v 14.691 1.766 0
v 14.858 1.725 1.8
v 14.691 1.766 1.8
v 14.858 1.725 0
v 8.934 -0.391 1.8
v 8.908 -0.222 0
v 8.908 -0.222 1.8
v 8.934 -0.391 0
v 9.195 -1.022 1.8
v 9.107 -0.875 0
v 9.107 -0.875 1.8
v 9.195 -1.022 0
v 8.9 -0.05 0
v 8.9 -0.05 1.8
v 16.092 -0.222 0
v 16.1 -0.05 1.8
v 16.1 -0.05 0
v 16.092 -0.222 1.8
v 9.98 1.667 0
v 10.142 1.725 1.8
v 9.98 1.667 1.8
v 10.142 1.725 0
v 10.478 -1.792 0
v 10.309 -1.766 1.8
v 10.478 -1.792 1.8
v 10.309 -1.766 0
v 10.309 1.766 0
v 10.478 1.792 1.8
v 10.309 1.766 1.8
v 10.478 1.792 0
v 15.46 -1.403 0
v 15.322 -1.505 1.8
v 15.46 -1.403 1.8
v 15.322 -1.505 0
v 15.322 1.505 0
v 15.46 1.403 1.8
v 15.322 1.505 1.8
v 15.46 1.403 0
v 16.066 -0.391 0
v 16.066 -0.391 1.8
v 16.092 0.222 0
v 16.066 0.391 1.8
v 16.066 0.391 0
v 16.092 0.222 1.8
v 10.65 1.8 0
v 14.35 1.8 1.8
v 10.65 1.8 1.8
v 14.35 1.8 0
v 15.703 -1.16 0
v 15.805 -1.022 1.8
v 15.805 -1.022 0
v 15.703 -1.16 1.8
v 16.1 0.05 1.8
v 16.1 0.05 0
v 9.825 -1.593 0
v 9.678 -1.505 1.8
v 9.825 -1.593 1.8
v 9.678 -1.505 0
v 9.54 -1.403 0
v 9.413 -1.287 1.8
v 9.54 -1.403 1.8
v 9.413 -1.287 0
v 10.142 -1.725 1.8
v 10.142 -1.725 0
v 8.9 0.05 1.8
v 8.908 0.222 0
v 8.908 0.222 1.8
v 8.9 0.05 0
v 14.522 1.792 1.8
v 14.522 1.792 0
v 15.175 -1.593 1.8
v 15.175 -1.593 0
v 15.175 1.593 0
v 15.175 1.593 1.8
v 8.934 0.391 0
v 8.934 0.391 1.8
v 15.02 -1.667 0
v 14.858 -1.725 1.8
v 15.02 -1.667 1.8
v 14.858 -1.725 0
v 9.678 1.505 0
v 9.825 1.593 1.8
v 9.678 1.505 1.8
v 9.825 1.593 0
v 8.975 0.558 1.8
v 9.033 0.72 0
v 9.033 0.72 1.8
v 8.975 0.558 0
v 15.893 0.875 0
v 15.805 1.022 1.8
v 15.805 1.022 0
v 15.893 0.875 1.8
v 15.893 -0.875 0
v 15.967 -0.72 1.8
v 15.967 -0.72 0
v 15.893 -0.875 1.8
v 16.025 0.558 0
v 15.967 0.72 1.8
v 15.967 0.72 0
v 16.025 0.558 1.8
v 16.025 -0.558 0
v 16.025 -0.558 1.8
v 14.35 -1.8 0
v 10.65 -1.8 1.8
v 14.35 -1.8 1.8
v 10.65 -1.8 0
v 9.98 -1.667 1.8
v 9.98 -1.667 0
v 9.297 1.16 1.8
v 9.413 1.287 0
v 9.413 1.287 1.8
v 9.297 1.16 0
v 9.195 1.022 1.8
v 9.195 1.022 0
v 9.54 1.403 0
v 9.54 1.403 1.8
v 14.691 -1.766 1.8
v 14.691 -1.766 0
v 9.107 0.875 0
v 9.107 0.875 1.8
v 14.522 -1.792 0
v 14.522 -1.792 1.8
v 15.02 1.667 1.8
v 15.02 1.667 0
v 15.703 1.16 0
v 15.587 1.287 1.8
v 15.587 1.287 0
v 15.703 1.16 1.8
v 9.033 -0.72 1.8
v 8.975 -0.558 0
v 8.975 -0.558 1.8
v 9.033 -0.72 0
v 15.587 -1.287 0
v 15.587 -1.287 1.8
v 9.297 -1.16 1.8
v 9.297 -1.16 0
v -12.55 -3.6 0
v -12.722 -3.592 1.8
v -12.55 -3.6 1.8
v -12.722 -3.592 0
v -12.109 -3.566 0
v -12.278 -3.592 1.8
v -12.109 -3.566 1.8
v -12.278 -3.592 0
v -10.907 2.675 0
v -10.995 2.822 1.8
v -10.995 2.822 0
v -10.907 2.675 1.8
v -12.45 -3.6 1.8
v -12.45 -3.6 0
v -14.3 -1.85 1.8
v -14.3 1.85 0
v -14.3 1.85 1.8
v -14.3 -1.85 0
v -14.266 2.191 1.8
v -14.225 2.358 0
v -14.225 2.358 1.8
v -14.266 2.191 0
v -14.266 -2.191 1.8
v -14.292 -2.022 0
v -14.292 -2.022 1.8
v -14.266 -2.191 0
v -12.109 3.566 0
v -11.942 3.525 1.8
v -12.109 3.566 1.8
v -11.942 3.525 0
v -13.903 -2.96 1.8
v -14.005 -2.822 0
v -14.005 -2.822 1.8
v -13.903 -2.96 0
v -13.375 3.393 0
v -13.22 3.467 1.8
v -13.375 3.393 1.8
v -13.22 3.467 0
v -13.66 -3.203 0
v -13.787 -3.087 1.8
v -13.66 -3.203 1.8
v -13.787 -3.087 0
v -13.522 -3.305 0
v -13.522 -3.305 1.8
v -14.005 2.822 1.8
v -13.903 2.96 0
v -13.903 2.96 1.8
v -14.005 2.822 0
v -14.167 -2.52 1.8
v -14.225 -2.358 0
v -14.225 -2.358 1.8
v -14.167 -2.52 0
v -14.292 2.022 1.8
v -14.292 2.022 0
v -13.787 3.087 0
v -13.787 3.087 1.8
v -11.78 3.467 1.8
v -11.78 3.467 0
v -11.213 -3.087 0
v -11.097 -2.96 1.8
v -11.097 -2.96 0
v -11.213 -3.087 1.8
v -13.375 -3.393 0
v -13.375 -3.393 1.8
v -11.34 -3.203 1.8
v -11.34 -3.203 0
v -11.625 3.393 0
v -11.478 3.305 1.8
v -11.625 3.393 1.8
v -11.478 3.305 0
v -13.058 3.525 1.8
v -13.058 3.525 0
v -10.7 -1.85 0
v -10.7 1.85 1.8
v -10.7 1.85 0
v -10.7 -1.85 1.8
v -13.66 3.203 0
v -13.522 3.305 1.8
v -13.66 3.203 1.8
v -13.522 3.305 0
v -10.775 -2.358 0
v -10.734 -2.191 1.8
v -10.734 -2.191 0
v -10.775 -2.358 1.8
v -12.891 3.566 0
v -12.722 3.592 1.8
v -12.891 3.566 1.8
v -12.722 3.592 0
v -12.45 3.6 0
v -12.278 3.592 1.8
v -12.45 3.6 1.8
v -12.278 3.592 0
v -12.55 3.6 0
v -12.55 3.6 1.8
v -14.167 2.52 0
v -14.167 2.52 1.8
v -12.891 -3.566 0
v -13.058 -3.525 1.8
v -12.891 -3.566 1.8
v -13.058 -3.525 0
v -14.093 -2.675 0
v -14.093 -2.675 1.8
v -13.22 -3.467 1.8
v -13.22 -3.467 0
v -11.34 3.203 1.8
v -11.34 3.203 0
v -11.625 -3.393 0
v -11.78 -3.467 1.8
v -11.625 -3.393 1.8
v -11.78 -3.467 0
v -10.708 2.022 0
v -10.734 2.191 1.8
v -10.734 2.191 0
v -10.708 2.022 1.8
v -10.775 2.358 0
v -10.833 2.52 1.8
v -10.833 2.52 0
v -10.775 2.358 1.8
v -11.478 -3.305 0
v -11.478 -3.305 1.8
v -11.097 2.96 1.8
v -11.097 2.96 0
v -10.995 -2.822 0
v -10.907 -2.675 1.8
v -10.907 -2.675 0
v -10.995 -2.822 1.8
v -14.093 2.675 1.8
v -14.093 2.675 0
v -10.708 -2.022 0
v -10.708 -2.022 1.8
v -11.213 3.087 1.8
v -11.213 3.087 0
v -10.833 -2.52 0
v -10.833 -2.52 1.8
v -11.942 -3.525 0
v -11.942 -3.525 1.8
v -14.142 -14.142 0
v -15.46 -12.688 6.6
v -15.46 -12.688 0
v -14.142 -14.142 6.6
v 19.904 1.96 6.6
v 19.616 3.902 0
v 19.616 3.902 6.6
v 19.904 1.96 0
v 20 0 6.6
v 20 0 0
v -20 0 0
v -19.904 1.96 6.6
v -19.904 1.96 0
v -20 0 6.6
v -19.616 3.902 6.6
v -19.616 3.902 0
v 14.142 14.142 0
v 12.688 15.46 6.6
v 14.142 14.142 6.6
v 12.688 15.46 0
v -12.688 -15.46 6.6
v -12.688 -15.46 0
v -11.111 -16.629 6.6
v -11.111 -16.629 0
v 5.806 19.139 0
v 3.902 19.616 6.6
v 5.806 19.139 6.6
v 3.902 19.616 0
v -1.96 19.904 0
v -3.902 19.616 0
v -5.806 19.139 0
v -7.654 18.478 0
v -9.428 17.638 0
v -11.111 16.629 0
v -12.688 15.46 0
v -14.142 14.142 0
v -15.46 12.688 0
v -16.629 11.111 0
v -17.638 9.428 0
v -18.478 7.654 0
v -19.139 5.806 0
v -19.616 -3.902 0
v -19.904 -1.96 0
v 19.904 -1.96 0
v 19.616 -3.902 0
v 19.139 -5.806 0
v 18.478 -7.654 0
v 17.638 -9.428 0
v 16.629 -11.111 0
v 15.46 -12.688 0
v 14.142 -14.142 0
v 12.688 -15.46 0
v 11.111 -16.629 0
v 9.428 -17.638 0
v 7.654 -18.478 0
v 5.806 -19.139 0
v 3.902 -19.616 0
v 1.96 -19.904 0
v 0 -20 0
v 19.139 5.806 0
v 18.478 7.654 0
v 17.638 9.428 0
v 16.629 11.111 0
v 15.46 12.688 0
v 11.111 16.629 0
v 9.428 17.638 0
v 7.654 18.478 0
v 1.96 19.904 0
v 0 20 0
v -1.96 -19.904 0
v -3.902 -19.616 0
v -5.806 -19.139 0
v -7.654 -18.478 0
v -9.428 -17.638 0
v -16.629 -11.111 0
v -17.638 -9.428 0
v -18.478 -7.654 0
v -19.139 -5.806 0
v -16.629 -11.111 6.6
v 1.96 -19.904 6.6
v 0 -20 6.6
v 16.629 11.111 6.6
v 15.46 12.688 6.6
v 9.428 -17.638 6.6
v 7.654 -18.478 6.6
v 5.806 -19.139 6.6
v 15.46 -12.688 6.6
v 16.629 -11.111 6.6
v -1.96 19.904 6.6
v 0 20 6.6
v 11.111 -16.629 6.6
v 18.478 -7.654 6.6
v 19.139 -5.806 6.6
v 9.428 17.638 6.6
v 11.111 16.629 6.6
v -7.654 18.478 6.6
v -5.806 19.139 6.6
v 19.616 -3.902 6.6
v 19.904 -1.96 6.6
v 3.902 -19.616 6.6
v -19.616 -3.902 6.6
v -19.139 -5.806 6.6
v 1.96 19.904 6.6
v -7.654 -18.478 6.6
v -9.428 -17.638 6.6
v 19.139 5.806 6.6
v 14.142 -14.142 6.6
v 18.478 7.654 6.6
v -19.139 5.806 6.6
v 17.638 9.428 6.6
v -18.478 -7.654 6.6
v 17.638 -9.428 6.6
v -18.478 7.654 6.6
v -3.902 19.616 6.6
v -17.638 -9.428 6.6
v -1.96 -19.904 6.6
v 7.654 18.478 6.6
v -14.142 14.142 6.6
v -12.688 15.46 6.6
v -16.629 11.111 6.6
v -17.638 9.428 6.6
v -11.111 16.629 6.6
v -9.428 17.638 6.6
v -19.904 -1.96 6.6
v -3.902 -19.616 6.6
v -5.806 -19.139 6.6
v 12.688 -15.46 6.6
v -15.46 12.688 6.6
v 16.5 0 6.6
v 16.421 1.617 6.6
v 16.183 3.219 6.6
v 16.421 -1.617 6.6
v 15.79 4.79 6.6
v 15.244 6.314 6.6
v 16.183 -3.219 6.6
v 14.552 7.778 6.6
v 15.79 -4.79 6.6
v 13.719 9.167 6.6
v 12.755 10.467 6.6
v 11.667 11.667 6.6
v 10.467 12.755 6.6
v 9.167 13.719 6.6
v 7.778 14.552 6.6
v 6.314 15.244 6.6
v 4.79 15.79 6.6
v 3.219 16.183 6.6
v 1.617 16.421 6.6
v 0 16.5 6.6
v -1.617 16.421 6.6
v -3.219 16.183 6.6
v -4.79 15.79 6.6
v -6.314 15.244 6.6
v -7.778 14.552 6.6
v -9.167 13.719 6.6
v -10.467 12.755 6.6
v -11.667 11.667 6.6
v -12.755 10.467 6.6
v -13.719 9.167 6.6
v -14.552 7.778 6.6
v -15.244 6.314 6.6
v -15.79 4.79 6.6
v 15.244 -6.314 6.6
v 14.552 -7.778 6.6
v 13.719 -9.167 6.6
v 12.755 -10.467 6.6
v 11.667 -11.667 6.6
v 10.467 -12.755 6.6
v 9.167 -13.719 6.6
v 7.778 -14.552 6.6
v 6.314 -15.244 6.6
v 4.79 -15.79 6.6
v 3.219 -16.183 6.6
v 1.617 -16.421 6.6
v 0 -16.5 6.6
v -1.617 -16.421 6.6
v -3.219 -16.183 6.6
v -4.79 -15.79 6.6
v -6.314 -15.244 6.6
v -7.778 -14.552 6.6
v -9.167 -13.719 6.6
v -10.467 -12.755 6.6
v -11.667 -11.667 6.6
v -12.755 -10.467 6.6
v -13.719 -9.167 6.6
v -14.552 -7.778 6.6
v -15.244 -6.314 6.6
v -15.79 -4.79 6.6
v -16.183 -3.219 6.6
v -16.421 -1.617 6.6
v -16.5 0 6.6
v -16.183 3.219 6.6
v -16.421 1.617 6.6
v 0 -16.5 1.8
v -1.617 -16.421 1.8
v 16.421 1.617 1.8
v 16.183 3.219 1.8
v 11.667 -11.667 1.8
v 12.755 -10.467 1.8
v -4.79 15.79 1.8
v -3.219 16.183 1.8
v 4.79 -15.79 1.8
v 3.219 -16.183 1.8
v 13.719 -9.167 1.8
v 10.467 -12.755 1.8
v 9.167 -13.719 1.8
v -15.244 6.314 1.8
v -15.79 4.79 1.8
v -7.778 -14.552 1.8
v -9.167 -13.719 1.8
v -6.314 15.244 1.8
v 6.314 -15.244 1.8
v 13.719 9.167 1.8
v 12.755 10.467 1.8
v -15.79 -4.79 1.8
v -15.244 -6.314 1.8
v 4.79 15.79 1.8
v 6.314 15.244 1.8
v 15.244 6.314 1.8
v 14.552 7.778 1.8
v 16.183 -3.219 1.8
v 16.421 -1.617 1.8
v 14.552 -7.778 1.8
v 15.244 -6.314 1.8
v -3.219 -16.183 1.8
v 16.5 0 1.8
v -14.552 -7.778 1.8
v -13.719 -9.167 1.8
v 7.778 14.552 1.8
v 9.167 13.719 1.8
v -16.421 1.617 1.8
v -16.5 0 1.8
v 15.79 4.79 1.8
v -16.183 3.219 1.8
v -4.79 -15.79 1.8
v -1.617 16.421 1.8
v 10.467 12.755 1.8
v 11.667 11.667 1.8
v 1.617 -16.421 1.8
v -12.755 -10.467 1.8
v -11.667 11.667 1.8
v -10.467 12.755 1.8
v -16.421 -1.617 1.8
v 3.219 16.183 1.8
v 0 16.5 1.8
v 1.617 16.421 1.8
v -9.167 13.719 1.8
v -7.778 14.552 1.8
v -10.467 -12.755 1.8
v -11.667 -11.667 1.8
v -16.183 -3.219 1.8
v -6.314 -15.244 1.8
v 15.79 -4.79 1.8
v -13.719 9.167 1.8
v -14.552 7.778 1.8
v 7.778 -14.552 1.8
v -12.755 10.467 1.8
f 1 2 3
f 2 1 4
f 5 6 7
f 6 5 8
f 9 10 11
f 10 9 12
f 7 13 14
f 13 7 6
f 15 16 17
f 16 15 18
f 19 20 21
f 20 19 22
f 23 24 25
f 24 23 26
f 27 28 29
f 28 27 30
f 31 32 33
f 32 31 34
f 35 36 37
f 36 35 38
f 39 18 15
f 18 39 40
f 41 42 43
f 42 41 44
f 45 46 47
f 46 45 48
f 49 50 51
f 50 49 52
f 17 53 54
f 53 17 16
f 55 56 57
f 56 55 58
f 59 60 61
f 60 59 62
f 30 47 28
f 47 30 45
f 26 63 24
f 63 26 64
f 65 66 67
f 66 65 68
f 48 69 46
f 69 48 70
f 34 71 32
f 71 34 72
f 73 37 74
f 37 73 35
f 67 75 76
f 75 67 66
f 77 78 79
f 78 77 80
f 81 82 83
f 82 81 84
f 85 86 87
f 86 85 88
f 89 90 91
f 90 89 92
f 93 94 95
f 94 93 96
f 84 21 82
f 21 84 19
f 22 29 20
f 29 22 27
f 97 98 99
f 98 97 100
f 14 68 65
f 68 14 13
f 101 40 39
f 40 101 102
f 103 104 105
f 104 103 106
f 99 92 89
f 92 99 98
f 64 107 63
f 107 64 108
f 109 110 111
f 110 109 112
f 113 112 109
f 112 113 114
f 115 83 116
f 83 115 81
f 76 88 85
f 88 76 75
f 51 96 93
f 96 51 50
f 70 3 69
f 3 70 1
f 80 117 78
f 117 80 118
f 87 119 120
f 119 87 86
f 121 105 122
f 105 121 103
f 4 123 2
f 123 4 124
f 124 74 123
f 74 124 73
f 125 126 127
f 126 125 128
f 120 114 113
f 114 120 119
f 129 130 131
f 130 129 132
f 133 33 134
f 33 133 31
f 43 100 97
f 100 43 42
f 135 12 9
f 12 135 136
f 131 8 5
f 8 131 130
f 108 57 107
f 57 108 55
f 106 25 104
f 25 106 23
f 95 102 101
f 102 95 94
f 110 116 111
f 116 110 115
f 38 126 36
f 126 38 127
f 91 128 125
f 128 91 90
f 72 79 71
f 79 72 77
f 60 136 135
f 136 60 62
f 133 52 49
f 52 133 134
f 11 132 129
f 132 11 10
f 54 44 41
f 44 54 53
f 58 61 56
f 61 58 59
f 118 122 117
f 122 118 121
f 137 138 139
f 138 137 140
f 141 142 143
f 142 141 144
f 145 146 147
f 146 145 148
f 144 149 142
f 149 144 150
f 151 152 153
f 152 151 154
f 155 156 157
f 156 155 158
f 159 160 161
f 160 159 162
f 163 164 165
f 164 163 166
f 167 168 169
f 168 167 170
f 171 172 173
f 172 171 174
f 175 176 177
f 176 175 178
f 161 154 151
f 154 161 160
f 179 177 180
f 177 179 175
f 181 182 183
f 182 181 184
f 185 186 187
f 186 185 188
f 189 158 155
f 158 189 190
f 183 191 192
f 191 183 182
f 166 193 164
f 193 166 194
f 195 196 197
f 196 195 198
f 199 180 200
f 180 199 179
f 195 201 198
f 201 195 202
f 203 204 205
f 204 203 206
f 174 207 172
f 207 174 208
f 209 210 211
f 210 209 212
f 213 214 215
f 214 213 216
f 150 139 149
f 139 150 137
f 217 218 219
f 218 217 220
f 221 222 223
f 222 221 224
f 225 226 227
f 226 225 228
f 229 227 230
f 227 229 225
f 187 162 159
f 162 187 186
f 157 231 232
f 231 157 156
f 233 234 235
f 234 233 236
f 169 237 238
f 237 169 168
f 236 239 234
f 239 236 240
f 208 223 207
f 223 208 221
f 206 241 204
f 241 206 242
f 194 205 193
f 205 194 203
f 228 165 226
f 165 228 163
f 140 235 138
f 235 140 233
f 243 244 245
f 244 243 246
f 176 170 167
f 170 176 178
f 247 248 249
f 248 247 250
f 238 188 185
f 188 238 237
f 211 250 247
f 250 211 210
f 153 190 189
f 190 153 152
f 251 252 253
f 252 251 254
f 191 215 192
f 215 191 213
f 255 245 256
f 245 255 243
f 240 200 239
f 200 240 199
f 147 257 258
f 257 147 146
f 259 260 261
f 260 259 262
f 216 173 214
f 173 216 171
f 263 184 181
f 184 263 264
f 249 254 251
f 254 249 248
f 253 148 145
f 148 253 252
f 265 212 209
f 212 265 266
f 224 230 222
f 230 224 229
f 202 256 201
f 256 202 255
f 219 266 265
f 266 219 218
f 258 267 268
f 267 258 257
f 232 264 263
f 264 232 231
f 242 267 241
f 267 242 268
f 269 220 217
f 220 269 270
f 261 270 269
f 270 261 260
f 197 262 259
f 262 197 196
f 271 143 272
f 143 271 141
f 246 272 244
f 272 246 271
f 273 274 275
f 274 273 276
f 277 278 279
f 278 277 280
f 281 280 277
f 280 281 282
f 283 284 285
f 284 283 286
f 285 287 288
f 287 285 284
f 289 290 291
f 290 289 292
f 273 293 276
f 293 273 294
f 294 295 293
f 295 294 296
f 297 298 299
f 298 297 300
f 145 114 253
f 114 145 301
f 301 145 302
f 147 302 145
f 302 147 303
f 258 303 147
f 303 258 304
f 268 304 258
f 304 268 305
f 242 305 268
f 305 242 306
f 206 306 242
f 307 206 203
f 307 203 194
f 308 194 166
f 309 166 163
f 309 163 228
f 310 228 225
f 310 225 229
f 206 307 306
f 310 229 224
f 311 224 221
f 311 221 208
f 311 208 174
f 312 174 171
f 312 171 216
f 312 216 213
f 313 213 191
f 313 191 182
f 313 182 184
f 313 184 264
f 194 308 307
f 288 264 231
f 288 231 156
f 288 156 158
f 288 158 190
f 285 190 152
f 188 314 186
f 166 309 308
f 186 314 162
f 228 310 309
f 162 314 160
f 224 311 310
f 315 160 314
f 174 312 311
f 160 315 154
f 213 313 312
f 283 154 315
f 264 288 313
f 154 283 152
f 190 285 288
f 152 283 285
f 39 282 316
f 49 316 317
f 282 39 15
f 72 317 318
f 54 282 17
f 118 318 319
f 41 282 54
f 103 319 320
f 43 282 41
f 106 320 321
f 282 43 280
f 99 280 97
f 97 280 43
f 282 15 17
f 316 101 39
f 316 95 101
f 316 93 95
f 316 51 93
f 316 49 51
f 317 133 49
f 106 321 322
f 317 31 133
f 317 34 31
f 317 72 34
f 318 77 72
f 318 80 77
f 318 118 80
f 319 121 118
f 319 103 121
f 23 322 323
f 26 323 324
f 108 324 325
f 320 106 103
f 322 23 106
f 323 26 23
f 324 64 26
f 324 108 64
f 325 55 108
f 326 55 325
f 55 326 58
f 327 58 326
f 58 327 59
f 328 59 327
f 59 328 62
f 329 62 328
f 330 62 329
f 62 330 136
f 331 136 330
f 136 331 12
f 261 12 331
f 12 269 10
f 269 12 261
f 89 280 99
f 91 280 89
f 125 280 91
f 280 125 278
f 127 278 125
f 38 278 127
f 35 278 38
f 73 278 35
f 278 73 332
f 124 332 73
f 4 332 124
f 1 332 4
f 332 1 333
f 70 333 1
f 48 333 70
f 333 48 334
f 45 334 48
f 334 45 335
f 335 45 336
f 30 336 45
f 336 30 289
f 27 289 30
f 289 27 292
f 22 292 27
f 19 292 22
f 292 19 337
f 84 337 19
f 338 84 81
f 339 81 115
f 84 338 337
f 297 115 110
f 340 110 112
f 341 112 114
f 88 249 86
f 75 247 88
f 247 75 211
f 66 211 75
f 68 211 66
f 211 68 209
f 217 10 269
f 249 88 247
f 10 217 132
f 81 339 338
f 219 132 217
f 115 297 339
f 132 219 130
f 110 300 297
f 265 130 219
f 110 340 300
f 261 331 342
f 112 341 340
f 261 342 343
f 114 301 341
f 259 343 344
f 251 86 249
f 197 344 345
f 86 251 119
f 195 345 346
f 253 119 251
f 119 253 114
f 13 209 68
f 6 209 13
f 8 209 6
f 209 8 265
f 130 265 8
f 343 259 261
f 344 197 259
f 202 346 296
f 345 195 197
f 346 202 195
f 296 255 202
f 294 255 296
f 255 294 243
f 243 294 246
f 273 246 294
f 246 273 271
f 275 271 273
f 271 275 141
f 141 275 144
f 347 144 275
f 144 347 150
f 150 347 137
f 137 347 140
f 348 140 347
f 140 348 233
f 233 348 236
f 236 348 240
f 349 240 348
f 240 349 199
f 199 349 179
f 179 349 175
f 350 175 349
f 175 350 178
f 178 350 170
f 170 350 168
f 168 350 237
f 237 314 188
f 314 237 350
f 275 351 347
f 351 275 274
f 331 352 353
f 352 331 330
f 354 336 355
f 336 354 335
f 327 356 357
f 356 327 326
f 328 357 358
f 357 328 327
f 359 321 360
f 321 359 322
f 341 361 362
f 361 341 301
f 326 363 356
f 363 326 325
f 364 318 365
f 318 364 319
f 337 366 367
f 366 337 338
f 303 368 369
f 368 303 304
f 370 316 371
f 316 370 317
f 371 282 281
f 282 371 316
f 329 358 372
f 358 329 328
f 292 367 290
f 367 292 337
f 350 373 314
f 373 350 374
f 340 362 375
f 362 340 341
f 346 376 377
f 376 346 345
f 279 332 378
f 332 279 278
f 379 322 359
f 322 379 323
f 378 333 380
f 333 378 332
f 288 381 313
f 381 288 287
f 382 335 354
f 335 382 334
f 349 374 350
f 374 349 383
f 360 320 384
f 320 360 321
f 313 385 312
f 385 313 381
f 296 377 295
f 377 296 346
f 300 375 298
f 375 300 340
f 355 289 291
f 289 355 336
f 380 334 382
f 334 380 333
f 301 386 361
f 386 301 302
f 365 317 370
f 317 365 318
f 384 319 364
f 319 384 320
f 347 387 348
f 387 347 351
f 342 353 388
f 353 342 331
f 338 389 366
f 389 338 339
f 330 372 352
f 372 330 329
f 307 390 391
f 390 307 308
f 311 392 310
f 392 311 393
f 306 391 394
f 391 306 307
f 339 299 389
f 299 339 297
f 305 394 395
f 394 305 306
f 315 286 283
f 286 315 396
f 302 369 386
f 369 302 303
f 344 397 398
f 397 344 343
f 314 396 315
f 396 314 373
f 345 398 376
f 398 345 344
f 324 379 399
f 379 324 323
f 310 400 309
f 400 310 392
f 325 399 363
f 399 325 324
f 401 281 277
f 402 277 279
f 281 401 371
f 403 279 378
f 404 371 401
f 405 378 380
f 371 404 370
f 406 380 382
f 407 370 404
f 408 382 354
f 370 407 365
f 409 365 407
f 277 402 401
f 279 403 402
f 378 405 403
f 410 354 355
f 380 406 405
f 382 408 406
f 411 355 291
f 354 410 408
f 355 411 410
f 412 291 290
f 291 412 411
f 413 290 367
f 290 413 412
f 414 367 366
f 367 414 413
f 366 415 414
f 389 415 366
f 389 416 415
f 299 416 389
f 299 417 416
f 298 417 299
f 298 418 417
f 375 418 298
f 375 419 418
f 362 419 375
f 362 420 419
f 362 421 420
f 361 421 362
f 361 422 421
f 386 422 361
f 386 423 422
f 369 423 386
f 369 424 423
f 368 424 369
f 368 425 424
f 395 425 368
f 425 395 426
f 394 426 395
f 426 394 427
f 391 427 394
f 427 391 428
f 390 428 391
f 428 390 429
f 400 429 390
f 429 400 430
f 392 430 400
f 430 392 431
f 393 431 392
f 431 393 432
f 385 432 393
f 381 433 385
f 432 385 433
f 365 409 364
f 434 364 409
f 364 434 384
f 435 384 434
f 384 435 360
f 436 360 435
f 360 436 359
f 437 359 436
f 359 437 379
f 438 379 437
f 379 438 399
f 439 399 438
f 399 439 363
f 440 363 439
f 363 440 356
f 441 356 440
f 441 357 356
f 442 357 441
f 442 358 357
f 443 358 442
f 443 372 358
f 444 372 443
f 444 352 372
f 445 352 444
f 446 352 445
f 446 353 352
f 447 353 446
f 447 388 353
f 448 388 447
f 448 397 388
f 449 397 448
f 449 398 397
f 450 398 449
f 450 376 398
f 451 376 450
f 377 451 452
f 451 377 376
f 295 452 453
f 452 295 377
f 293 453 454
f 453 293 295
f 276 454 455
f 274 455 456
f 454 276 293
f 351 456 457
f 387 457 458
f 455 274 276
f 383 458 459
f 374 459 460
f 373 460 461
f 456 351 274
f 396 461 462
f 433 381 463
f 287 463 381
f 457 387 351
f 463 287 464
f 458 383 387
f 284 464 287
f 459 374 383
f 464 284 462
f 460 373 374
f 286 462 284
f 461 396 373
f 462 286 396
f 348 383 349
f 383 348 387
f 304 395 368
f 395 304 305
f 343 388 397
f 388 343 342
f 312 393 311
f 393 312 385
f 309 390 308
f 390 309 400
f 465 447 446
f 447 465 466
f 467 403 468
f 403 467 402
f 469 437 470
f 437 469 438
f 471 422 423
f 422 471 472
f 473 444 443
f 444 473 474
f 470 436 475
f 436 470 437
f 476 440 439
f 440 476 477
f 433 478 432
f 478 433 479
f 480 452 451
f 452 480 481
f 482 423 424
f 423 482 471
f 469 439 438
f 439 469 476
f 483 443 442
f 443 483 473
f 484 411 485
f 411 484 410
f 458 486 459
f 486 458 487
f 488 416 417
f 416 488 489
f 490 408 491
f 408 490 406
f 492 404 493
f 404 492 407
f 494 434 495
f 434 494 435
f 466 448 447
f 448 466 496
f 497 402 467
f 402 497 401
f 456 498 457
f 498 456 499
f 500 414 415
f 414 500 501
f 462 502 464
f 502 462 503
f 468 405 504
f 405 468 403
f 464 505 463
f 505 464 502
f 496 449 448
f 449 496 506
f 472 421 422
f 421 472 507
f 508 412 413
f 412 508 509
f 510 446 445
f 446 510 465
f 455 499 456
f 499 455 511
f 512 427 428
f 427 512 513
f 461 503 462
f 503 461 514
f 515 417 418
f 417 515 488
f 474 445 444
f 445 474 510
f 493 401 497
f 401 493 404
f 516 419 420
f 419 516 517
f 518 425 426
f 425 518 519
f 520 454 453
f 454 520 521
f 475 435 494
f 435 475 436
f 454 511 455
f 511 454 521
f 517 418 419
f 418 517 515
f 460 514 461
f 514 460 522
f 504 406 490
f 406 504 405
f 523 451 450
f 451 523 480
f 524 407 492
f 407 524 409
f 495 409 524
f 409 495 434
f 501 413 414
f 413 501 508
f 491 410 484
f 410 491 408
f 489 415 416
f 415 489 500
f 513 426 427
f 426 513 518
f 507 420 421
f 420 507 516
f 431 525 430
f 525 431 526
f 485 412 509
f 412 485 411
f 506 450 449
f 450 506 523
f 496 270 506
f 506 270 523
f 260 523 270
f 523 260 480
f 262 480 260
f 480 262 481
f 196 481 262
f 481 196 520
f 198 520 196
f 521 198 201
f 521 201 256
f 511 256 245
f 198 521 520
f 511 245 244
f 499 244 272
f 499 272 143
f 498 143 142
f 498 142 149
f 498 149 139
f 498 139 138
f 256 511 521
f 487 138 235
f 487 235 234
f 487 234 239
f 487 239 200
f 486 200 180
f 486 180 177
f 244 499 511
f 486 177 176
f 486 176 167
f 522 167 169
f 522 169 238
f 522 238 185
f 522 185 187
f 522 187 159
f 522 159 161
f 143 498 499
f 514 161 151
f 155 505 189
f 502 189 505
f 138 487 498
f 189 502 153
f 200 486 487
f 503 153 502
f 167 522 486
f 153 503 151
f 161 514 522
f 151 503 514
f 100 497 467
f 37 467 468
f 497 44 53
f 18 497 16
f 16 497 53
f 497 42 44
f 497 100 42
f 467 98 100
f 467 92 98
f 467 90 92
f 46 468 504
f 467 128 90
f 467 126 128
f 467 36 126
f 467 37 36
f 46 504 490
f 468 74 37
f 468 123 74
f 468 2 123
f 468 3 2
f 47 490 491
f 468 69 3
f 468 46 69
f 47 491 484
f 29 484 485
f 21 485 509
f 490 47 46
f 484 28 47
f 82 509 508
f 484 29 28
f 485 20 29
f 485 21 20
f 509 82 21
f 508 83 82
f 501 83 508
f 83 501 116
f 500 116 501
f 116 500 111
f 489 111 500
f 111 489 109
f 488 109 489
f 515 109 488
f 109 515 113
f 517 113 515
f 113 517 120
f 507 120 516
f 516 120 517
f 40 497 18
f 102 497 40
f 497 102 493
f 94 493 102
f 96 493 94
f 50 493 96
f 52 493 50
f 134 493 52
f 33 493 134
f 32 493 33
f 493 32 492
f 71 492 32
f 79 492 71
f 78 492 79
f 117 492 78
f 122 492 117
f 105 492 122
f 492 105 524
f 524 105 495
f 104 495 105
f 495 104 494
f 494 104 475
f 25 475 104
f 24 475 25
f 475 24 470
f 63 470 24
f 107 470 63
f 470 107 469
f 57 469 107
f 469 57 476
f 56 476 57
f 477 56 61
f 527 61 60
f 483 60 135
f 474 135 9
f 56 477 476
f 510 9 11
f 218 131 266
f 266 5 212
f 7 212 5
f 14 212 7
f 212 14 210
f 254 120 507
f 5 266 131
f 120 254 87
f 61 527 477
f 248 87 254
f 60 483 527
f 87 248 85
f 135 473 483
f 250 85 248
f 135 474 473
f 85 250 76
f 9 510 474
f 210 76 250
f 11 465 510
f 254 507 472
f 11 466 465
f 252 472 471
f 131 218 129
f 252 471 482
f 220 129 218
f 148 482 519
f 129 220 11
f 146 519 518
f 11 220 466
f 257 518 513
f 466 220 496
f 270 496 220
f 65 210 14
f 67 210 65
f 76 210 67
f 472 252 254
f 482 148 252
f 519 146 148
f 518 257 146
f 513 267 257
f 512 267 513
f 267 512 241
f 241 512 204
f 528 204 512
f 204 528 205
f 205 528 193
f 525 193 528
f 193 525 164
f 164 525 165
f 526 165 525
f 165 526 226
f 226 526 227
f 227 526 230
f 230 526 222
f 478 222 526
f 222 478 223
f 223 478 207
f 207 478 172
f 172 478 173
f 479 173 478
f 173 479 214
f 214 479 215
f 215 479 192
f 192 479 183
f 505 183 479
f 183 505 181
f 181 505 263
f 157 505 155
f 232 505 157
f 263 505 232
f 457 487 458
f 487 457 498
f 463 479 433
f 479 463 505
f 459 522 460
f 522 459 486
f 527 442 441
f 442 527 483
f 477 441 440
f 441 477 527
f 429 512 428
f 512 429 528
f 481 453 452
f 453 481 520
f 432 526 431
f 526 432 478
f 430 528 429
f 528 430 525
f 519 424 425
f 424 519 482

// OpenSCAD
// file: bathroomHolderCircle/pin_cutouts.scad
// Pin holes: rounded-rectangle profile in plan (flat sides, arcs only in corners — not ellipse-like).
// Axis along Z (normal to the flat lid). Centers symmetric on ±X at pin_offset_from_axis.

pin_plan_w = 7.2;
pin_plan_h = 3.6;
// Corner radius: must be < min(w,h)/2 (here h/2 = 1.8) so a thin flat remains on the short sides.
pin_corner_r = 1.75;
pin_height = 3;

// Half-distance from Z-axis to each pin center (pair is symmetric through origin).
pin_offset_from_axis = 12.5;

// 2D rounded rectangle centered at origin (w ≥ h after rotation at call site).
module rounded_rect_2d(w, h, r) {
    iw = w / 2 - r;
    ih = h / 2 - r;
    hull() {
        translate([iw, ih])
            circle(r = r);
        translate([-iw, ih])
            circle(r = r);
        translate([iw, -ih])
            circle(r = r);
        translate([-iw, -ih])
            circle(r = r);
    }
}

// Extruded rounded rect; rotation_z_deg swaps long/short axis in plan (horizontal vs vertical).
module rounded_rect_pin_cutout(rotation_z_deg) {
    rotate([0, 0, rotation_z_deg])
        linear_extrude(height = pin_height, center = false)
            rounded_rect_2d(pin_plan_w, pin_plan_h, pin_corner_r);
}

module pin_cutouts() {
    translate([0, 0, -1]) {
        translate([pin_offset_from_axis, 0, 0])
            rounded_rect_pin_cutout(0);
        translate([-pin_offset_from_axis, 0, 0])
            rounded_rect_pin_cutout(90);
    }
}
// file: bathroomHolderCircle/cutout_cylinder.scad
// Cutout cylinder: Ø33 mm. Height = (base height 6.6 − bottom wall 1.8) + 1 mm past the
// top face so the boolean is not coplanar with the lid. Same XY center as base_cylinder().
module cutout_cylinder() {
    translate([0, 0, 1.8])
        cylinder(h = 5.8, d = 33, center = false);
}
// file: bathroomHolderCircle/base_cylinder.scad
// Base cylinder for bathroom holder (circle variant): Ø40 mm, height 6.6 mm.
// Bottom on Z=0, extends along +Z.
module base_cylinder() {
    color([0.55, 0.33, 0.2])
        cylinder(h = 6.6, d = 40, center = false);
}
// main file
include <bathroomHolderCircle/base_cylinder.scad>
include <bathroomHolderCircle/cutout_cylinder.scad>
include <bathroomHolderCircle/pin_cutouts.scad>

$fn = 64; // more then enought to print on BambuLab A1 mini

difference() {
    base_cylinder();
    cutout_cylinder();
    pin_cutouts();
}
